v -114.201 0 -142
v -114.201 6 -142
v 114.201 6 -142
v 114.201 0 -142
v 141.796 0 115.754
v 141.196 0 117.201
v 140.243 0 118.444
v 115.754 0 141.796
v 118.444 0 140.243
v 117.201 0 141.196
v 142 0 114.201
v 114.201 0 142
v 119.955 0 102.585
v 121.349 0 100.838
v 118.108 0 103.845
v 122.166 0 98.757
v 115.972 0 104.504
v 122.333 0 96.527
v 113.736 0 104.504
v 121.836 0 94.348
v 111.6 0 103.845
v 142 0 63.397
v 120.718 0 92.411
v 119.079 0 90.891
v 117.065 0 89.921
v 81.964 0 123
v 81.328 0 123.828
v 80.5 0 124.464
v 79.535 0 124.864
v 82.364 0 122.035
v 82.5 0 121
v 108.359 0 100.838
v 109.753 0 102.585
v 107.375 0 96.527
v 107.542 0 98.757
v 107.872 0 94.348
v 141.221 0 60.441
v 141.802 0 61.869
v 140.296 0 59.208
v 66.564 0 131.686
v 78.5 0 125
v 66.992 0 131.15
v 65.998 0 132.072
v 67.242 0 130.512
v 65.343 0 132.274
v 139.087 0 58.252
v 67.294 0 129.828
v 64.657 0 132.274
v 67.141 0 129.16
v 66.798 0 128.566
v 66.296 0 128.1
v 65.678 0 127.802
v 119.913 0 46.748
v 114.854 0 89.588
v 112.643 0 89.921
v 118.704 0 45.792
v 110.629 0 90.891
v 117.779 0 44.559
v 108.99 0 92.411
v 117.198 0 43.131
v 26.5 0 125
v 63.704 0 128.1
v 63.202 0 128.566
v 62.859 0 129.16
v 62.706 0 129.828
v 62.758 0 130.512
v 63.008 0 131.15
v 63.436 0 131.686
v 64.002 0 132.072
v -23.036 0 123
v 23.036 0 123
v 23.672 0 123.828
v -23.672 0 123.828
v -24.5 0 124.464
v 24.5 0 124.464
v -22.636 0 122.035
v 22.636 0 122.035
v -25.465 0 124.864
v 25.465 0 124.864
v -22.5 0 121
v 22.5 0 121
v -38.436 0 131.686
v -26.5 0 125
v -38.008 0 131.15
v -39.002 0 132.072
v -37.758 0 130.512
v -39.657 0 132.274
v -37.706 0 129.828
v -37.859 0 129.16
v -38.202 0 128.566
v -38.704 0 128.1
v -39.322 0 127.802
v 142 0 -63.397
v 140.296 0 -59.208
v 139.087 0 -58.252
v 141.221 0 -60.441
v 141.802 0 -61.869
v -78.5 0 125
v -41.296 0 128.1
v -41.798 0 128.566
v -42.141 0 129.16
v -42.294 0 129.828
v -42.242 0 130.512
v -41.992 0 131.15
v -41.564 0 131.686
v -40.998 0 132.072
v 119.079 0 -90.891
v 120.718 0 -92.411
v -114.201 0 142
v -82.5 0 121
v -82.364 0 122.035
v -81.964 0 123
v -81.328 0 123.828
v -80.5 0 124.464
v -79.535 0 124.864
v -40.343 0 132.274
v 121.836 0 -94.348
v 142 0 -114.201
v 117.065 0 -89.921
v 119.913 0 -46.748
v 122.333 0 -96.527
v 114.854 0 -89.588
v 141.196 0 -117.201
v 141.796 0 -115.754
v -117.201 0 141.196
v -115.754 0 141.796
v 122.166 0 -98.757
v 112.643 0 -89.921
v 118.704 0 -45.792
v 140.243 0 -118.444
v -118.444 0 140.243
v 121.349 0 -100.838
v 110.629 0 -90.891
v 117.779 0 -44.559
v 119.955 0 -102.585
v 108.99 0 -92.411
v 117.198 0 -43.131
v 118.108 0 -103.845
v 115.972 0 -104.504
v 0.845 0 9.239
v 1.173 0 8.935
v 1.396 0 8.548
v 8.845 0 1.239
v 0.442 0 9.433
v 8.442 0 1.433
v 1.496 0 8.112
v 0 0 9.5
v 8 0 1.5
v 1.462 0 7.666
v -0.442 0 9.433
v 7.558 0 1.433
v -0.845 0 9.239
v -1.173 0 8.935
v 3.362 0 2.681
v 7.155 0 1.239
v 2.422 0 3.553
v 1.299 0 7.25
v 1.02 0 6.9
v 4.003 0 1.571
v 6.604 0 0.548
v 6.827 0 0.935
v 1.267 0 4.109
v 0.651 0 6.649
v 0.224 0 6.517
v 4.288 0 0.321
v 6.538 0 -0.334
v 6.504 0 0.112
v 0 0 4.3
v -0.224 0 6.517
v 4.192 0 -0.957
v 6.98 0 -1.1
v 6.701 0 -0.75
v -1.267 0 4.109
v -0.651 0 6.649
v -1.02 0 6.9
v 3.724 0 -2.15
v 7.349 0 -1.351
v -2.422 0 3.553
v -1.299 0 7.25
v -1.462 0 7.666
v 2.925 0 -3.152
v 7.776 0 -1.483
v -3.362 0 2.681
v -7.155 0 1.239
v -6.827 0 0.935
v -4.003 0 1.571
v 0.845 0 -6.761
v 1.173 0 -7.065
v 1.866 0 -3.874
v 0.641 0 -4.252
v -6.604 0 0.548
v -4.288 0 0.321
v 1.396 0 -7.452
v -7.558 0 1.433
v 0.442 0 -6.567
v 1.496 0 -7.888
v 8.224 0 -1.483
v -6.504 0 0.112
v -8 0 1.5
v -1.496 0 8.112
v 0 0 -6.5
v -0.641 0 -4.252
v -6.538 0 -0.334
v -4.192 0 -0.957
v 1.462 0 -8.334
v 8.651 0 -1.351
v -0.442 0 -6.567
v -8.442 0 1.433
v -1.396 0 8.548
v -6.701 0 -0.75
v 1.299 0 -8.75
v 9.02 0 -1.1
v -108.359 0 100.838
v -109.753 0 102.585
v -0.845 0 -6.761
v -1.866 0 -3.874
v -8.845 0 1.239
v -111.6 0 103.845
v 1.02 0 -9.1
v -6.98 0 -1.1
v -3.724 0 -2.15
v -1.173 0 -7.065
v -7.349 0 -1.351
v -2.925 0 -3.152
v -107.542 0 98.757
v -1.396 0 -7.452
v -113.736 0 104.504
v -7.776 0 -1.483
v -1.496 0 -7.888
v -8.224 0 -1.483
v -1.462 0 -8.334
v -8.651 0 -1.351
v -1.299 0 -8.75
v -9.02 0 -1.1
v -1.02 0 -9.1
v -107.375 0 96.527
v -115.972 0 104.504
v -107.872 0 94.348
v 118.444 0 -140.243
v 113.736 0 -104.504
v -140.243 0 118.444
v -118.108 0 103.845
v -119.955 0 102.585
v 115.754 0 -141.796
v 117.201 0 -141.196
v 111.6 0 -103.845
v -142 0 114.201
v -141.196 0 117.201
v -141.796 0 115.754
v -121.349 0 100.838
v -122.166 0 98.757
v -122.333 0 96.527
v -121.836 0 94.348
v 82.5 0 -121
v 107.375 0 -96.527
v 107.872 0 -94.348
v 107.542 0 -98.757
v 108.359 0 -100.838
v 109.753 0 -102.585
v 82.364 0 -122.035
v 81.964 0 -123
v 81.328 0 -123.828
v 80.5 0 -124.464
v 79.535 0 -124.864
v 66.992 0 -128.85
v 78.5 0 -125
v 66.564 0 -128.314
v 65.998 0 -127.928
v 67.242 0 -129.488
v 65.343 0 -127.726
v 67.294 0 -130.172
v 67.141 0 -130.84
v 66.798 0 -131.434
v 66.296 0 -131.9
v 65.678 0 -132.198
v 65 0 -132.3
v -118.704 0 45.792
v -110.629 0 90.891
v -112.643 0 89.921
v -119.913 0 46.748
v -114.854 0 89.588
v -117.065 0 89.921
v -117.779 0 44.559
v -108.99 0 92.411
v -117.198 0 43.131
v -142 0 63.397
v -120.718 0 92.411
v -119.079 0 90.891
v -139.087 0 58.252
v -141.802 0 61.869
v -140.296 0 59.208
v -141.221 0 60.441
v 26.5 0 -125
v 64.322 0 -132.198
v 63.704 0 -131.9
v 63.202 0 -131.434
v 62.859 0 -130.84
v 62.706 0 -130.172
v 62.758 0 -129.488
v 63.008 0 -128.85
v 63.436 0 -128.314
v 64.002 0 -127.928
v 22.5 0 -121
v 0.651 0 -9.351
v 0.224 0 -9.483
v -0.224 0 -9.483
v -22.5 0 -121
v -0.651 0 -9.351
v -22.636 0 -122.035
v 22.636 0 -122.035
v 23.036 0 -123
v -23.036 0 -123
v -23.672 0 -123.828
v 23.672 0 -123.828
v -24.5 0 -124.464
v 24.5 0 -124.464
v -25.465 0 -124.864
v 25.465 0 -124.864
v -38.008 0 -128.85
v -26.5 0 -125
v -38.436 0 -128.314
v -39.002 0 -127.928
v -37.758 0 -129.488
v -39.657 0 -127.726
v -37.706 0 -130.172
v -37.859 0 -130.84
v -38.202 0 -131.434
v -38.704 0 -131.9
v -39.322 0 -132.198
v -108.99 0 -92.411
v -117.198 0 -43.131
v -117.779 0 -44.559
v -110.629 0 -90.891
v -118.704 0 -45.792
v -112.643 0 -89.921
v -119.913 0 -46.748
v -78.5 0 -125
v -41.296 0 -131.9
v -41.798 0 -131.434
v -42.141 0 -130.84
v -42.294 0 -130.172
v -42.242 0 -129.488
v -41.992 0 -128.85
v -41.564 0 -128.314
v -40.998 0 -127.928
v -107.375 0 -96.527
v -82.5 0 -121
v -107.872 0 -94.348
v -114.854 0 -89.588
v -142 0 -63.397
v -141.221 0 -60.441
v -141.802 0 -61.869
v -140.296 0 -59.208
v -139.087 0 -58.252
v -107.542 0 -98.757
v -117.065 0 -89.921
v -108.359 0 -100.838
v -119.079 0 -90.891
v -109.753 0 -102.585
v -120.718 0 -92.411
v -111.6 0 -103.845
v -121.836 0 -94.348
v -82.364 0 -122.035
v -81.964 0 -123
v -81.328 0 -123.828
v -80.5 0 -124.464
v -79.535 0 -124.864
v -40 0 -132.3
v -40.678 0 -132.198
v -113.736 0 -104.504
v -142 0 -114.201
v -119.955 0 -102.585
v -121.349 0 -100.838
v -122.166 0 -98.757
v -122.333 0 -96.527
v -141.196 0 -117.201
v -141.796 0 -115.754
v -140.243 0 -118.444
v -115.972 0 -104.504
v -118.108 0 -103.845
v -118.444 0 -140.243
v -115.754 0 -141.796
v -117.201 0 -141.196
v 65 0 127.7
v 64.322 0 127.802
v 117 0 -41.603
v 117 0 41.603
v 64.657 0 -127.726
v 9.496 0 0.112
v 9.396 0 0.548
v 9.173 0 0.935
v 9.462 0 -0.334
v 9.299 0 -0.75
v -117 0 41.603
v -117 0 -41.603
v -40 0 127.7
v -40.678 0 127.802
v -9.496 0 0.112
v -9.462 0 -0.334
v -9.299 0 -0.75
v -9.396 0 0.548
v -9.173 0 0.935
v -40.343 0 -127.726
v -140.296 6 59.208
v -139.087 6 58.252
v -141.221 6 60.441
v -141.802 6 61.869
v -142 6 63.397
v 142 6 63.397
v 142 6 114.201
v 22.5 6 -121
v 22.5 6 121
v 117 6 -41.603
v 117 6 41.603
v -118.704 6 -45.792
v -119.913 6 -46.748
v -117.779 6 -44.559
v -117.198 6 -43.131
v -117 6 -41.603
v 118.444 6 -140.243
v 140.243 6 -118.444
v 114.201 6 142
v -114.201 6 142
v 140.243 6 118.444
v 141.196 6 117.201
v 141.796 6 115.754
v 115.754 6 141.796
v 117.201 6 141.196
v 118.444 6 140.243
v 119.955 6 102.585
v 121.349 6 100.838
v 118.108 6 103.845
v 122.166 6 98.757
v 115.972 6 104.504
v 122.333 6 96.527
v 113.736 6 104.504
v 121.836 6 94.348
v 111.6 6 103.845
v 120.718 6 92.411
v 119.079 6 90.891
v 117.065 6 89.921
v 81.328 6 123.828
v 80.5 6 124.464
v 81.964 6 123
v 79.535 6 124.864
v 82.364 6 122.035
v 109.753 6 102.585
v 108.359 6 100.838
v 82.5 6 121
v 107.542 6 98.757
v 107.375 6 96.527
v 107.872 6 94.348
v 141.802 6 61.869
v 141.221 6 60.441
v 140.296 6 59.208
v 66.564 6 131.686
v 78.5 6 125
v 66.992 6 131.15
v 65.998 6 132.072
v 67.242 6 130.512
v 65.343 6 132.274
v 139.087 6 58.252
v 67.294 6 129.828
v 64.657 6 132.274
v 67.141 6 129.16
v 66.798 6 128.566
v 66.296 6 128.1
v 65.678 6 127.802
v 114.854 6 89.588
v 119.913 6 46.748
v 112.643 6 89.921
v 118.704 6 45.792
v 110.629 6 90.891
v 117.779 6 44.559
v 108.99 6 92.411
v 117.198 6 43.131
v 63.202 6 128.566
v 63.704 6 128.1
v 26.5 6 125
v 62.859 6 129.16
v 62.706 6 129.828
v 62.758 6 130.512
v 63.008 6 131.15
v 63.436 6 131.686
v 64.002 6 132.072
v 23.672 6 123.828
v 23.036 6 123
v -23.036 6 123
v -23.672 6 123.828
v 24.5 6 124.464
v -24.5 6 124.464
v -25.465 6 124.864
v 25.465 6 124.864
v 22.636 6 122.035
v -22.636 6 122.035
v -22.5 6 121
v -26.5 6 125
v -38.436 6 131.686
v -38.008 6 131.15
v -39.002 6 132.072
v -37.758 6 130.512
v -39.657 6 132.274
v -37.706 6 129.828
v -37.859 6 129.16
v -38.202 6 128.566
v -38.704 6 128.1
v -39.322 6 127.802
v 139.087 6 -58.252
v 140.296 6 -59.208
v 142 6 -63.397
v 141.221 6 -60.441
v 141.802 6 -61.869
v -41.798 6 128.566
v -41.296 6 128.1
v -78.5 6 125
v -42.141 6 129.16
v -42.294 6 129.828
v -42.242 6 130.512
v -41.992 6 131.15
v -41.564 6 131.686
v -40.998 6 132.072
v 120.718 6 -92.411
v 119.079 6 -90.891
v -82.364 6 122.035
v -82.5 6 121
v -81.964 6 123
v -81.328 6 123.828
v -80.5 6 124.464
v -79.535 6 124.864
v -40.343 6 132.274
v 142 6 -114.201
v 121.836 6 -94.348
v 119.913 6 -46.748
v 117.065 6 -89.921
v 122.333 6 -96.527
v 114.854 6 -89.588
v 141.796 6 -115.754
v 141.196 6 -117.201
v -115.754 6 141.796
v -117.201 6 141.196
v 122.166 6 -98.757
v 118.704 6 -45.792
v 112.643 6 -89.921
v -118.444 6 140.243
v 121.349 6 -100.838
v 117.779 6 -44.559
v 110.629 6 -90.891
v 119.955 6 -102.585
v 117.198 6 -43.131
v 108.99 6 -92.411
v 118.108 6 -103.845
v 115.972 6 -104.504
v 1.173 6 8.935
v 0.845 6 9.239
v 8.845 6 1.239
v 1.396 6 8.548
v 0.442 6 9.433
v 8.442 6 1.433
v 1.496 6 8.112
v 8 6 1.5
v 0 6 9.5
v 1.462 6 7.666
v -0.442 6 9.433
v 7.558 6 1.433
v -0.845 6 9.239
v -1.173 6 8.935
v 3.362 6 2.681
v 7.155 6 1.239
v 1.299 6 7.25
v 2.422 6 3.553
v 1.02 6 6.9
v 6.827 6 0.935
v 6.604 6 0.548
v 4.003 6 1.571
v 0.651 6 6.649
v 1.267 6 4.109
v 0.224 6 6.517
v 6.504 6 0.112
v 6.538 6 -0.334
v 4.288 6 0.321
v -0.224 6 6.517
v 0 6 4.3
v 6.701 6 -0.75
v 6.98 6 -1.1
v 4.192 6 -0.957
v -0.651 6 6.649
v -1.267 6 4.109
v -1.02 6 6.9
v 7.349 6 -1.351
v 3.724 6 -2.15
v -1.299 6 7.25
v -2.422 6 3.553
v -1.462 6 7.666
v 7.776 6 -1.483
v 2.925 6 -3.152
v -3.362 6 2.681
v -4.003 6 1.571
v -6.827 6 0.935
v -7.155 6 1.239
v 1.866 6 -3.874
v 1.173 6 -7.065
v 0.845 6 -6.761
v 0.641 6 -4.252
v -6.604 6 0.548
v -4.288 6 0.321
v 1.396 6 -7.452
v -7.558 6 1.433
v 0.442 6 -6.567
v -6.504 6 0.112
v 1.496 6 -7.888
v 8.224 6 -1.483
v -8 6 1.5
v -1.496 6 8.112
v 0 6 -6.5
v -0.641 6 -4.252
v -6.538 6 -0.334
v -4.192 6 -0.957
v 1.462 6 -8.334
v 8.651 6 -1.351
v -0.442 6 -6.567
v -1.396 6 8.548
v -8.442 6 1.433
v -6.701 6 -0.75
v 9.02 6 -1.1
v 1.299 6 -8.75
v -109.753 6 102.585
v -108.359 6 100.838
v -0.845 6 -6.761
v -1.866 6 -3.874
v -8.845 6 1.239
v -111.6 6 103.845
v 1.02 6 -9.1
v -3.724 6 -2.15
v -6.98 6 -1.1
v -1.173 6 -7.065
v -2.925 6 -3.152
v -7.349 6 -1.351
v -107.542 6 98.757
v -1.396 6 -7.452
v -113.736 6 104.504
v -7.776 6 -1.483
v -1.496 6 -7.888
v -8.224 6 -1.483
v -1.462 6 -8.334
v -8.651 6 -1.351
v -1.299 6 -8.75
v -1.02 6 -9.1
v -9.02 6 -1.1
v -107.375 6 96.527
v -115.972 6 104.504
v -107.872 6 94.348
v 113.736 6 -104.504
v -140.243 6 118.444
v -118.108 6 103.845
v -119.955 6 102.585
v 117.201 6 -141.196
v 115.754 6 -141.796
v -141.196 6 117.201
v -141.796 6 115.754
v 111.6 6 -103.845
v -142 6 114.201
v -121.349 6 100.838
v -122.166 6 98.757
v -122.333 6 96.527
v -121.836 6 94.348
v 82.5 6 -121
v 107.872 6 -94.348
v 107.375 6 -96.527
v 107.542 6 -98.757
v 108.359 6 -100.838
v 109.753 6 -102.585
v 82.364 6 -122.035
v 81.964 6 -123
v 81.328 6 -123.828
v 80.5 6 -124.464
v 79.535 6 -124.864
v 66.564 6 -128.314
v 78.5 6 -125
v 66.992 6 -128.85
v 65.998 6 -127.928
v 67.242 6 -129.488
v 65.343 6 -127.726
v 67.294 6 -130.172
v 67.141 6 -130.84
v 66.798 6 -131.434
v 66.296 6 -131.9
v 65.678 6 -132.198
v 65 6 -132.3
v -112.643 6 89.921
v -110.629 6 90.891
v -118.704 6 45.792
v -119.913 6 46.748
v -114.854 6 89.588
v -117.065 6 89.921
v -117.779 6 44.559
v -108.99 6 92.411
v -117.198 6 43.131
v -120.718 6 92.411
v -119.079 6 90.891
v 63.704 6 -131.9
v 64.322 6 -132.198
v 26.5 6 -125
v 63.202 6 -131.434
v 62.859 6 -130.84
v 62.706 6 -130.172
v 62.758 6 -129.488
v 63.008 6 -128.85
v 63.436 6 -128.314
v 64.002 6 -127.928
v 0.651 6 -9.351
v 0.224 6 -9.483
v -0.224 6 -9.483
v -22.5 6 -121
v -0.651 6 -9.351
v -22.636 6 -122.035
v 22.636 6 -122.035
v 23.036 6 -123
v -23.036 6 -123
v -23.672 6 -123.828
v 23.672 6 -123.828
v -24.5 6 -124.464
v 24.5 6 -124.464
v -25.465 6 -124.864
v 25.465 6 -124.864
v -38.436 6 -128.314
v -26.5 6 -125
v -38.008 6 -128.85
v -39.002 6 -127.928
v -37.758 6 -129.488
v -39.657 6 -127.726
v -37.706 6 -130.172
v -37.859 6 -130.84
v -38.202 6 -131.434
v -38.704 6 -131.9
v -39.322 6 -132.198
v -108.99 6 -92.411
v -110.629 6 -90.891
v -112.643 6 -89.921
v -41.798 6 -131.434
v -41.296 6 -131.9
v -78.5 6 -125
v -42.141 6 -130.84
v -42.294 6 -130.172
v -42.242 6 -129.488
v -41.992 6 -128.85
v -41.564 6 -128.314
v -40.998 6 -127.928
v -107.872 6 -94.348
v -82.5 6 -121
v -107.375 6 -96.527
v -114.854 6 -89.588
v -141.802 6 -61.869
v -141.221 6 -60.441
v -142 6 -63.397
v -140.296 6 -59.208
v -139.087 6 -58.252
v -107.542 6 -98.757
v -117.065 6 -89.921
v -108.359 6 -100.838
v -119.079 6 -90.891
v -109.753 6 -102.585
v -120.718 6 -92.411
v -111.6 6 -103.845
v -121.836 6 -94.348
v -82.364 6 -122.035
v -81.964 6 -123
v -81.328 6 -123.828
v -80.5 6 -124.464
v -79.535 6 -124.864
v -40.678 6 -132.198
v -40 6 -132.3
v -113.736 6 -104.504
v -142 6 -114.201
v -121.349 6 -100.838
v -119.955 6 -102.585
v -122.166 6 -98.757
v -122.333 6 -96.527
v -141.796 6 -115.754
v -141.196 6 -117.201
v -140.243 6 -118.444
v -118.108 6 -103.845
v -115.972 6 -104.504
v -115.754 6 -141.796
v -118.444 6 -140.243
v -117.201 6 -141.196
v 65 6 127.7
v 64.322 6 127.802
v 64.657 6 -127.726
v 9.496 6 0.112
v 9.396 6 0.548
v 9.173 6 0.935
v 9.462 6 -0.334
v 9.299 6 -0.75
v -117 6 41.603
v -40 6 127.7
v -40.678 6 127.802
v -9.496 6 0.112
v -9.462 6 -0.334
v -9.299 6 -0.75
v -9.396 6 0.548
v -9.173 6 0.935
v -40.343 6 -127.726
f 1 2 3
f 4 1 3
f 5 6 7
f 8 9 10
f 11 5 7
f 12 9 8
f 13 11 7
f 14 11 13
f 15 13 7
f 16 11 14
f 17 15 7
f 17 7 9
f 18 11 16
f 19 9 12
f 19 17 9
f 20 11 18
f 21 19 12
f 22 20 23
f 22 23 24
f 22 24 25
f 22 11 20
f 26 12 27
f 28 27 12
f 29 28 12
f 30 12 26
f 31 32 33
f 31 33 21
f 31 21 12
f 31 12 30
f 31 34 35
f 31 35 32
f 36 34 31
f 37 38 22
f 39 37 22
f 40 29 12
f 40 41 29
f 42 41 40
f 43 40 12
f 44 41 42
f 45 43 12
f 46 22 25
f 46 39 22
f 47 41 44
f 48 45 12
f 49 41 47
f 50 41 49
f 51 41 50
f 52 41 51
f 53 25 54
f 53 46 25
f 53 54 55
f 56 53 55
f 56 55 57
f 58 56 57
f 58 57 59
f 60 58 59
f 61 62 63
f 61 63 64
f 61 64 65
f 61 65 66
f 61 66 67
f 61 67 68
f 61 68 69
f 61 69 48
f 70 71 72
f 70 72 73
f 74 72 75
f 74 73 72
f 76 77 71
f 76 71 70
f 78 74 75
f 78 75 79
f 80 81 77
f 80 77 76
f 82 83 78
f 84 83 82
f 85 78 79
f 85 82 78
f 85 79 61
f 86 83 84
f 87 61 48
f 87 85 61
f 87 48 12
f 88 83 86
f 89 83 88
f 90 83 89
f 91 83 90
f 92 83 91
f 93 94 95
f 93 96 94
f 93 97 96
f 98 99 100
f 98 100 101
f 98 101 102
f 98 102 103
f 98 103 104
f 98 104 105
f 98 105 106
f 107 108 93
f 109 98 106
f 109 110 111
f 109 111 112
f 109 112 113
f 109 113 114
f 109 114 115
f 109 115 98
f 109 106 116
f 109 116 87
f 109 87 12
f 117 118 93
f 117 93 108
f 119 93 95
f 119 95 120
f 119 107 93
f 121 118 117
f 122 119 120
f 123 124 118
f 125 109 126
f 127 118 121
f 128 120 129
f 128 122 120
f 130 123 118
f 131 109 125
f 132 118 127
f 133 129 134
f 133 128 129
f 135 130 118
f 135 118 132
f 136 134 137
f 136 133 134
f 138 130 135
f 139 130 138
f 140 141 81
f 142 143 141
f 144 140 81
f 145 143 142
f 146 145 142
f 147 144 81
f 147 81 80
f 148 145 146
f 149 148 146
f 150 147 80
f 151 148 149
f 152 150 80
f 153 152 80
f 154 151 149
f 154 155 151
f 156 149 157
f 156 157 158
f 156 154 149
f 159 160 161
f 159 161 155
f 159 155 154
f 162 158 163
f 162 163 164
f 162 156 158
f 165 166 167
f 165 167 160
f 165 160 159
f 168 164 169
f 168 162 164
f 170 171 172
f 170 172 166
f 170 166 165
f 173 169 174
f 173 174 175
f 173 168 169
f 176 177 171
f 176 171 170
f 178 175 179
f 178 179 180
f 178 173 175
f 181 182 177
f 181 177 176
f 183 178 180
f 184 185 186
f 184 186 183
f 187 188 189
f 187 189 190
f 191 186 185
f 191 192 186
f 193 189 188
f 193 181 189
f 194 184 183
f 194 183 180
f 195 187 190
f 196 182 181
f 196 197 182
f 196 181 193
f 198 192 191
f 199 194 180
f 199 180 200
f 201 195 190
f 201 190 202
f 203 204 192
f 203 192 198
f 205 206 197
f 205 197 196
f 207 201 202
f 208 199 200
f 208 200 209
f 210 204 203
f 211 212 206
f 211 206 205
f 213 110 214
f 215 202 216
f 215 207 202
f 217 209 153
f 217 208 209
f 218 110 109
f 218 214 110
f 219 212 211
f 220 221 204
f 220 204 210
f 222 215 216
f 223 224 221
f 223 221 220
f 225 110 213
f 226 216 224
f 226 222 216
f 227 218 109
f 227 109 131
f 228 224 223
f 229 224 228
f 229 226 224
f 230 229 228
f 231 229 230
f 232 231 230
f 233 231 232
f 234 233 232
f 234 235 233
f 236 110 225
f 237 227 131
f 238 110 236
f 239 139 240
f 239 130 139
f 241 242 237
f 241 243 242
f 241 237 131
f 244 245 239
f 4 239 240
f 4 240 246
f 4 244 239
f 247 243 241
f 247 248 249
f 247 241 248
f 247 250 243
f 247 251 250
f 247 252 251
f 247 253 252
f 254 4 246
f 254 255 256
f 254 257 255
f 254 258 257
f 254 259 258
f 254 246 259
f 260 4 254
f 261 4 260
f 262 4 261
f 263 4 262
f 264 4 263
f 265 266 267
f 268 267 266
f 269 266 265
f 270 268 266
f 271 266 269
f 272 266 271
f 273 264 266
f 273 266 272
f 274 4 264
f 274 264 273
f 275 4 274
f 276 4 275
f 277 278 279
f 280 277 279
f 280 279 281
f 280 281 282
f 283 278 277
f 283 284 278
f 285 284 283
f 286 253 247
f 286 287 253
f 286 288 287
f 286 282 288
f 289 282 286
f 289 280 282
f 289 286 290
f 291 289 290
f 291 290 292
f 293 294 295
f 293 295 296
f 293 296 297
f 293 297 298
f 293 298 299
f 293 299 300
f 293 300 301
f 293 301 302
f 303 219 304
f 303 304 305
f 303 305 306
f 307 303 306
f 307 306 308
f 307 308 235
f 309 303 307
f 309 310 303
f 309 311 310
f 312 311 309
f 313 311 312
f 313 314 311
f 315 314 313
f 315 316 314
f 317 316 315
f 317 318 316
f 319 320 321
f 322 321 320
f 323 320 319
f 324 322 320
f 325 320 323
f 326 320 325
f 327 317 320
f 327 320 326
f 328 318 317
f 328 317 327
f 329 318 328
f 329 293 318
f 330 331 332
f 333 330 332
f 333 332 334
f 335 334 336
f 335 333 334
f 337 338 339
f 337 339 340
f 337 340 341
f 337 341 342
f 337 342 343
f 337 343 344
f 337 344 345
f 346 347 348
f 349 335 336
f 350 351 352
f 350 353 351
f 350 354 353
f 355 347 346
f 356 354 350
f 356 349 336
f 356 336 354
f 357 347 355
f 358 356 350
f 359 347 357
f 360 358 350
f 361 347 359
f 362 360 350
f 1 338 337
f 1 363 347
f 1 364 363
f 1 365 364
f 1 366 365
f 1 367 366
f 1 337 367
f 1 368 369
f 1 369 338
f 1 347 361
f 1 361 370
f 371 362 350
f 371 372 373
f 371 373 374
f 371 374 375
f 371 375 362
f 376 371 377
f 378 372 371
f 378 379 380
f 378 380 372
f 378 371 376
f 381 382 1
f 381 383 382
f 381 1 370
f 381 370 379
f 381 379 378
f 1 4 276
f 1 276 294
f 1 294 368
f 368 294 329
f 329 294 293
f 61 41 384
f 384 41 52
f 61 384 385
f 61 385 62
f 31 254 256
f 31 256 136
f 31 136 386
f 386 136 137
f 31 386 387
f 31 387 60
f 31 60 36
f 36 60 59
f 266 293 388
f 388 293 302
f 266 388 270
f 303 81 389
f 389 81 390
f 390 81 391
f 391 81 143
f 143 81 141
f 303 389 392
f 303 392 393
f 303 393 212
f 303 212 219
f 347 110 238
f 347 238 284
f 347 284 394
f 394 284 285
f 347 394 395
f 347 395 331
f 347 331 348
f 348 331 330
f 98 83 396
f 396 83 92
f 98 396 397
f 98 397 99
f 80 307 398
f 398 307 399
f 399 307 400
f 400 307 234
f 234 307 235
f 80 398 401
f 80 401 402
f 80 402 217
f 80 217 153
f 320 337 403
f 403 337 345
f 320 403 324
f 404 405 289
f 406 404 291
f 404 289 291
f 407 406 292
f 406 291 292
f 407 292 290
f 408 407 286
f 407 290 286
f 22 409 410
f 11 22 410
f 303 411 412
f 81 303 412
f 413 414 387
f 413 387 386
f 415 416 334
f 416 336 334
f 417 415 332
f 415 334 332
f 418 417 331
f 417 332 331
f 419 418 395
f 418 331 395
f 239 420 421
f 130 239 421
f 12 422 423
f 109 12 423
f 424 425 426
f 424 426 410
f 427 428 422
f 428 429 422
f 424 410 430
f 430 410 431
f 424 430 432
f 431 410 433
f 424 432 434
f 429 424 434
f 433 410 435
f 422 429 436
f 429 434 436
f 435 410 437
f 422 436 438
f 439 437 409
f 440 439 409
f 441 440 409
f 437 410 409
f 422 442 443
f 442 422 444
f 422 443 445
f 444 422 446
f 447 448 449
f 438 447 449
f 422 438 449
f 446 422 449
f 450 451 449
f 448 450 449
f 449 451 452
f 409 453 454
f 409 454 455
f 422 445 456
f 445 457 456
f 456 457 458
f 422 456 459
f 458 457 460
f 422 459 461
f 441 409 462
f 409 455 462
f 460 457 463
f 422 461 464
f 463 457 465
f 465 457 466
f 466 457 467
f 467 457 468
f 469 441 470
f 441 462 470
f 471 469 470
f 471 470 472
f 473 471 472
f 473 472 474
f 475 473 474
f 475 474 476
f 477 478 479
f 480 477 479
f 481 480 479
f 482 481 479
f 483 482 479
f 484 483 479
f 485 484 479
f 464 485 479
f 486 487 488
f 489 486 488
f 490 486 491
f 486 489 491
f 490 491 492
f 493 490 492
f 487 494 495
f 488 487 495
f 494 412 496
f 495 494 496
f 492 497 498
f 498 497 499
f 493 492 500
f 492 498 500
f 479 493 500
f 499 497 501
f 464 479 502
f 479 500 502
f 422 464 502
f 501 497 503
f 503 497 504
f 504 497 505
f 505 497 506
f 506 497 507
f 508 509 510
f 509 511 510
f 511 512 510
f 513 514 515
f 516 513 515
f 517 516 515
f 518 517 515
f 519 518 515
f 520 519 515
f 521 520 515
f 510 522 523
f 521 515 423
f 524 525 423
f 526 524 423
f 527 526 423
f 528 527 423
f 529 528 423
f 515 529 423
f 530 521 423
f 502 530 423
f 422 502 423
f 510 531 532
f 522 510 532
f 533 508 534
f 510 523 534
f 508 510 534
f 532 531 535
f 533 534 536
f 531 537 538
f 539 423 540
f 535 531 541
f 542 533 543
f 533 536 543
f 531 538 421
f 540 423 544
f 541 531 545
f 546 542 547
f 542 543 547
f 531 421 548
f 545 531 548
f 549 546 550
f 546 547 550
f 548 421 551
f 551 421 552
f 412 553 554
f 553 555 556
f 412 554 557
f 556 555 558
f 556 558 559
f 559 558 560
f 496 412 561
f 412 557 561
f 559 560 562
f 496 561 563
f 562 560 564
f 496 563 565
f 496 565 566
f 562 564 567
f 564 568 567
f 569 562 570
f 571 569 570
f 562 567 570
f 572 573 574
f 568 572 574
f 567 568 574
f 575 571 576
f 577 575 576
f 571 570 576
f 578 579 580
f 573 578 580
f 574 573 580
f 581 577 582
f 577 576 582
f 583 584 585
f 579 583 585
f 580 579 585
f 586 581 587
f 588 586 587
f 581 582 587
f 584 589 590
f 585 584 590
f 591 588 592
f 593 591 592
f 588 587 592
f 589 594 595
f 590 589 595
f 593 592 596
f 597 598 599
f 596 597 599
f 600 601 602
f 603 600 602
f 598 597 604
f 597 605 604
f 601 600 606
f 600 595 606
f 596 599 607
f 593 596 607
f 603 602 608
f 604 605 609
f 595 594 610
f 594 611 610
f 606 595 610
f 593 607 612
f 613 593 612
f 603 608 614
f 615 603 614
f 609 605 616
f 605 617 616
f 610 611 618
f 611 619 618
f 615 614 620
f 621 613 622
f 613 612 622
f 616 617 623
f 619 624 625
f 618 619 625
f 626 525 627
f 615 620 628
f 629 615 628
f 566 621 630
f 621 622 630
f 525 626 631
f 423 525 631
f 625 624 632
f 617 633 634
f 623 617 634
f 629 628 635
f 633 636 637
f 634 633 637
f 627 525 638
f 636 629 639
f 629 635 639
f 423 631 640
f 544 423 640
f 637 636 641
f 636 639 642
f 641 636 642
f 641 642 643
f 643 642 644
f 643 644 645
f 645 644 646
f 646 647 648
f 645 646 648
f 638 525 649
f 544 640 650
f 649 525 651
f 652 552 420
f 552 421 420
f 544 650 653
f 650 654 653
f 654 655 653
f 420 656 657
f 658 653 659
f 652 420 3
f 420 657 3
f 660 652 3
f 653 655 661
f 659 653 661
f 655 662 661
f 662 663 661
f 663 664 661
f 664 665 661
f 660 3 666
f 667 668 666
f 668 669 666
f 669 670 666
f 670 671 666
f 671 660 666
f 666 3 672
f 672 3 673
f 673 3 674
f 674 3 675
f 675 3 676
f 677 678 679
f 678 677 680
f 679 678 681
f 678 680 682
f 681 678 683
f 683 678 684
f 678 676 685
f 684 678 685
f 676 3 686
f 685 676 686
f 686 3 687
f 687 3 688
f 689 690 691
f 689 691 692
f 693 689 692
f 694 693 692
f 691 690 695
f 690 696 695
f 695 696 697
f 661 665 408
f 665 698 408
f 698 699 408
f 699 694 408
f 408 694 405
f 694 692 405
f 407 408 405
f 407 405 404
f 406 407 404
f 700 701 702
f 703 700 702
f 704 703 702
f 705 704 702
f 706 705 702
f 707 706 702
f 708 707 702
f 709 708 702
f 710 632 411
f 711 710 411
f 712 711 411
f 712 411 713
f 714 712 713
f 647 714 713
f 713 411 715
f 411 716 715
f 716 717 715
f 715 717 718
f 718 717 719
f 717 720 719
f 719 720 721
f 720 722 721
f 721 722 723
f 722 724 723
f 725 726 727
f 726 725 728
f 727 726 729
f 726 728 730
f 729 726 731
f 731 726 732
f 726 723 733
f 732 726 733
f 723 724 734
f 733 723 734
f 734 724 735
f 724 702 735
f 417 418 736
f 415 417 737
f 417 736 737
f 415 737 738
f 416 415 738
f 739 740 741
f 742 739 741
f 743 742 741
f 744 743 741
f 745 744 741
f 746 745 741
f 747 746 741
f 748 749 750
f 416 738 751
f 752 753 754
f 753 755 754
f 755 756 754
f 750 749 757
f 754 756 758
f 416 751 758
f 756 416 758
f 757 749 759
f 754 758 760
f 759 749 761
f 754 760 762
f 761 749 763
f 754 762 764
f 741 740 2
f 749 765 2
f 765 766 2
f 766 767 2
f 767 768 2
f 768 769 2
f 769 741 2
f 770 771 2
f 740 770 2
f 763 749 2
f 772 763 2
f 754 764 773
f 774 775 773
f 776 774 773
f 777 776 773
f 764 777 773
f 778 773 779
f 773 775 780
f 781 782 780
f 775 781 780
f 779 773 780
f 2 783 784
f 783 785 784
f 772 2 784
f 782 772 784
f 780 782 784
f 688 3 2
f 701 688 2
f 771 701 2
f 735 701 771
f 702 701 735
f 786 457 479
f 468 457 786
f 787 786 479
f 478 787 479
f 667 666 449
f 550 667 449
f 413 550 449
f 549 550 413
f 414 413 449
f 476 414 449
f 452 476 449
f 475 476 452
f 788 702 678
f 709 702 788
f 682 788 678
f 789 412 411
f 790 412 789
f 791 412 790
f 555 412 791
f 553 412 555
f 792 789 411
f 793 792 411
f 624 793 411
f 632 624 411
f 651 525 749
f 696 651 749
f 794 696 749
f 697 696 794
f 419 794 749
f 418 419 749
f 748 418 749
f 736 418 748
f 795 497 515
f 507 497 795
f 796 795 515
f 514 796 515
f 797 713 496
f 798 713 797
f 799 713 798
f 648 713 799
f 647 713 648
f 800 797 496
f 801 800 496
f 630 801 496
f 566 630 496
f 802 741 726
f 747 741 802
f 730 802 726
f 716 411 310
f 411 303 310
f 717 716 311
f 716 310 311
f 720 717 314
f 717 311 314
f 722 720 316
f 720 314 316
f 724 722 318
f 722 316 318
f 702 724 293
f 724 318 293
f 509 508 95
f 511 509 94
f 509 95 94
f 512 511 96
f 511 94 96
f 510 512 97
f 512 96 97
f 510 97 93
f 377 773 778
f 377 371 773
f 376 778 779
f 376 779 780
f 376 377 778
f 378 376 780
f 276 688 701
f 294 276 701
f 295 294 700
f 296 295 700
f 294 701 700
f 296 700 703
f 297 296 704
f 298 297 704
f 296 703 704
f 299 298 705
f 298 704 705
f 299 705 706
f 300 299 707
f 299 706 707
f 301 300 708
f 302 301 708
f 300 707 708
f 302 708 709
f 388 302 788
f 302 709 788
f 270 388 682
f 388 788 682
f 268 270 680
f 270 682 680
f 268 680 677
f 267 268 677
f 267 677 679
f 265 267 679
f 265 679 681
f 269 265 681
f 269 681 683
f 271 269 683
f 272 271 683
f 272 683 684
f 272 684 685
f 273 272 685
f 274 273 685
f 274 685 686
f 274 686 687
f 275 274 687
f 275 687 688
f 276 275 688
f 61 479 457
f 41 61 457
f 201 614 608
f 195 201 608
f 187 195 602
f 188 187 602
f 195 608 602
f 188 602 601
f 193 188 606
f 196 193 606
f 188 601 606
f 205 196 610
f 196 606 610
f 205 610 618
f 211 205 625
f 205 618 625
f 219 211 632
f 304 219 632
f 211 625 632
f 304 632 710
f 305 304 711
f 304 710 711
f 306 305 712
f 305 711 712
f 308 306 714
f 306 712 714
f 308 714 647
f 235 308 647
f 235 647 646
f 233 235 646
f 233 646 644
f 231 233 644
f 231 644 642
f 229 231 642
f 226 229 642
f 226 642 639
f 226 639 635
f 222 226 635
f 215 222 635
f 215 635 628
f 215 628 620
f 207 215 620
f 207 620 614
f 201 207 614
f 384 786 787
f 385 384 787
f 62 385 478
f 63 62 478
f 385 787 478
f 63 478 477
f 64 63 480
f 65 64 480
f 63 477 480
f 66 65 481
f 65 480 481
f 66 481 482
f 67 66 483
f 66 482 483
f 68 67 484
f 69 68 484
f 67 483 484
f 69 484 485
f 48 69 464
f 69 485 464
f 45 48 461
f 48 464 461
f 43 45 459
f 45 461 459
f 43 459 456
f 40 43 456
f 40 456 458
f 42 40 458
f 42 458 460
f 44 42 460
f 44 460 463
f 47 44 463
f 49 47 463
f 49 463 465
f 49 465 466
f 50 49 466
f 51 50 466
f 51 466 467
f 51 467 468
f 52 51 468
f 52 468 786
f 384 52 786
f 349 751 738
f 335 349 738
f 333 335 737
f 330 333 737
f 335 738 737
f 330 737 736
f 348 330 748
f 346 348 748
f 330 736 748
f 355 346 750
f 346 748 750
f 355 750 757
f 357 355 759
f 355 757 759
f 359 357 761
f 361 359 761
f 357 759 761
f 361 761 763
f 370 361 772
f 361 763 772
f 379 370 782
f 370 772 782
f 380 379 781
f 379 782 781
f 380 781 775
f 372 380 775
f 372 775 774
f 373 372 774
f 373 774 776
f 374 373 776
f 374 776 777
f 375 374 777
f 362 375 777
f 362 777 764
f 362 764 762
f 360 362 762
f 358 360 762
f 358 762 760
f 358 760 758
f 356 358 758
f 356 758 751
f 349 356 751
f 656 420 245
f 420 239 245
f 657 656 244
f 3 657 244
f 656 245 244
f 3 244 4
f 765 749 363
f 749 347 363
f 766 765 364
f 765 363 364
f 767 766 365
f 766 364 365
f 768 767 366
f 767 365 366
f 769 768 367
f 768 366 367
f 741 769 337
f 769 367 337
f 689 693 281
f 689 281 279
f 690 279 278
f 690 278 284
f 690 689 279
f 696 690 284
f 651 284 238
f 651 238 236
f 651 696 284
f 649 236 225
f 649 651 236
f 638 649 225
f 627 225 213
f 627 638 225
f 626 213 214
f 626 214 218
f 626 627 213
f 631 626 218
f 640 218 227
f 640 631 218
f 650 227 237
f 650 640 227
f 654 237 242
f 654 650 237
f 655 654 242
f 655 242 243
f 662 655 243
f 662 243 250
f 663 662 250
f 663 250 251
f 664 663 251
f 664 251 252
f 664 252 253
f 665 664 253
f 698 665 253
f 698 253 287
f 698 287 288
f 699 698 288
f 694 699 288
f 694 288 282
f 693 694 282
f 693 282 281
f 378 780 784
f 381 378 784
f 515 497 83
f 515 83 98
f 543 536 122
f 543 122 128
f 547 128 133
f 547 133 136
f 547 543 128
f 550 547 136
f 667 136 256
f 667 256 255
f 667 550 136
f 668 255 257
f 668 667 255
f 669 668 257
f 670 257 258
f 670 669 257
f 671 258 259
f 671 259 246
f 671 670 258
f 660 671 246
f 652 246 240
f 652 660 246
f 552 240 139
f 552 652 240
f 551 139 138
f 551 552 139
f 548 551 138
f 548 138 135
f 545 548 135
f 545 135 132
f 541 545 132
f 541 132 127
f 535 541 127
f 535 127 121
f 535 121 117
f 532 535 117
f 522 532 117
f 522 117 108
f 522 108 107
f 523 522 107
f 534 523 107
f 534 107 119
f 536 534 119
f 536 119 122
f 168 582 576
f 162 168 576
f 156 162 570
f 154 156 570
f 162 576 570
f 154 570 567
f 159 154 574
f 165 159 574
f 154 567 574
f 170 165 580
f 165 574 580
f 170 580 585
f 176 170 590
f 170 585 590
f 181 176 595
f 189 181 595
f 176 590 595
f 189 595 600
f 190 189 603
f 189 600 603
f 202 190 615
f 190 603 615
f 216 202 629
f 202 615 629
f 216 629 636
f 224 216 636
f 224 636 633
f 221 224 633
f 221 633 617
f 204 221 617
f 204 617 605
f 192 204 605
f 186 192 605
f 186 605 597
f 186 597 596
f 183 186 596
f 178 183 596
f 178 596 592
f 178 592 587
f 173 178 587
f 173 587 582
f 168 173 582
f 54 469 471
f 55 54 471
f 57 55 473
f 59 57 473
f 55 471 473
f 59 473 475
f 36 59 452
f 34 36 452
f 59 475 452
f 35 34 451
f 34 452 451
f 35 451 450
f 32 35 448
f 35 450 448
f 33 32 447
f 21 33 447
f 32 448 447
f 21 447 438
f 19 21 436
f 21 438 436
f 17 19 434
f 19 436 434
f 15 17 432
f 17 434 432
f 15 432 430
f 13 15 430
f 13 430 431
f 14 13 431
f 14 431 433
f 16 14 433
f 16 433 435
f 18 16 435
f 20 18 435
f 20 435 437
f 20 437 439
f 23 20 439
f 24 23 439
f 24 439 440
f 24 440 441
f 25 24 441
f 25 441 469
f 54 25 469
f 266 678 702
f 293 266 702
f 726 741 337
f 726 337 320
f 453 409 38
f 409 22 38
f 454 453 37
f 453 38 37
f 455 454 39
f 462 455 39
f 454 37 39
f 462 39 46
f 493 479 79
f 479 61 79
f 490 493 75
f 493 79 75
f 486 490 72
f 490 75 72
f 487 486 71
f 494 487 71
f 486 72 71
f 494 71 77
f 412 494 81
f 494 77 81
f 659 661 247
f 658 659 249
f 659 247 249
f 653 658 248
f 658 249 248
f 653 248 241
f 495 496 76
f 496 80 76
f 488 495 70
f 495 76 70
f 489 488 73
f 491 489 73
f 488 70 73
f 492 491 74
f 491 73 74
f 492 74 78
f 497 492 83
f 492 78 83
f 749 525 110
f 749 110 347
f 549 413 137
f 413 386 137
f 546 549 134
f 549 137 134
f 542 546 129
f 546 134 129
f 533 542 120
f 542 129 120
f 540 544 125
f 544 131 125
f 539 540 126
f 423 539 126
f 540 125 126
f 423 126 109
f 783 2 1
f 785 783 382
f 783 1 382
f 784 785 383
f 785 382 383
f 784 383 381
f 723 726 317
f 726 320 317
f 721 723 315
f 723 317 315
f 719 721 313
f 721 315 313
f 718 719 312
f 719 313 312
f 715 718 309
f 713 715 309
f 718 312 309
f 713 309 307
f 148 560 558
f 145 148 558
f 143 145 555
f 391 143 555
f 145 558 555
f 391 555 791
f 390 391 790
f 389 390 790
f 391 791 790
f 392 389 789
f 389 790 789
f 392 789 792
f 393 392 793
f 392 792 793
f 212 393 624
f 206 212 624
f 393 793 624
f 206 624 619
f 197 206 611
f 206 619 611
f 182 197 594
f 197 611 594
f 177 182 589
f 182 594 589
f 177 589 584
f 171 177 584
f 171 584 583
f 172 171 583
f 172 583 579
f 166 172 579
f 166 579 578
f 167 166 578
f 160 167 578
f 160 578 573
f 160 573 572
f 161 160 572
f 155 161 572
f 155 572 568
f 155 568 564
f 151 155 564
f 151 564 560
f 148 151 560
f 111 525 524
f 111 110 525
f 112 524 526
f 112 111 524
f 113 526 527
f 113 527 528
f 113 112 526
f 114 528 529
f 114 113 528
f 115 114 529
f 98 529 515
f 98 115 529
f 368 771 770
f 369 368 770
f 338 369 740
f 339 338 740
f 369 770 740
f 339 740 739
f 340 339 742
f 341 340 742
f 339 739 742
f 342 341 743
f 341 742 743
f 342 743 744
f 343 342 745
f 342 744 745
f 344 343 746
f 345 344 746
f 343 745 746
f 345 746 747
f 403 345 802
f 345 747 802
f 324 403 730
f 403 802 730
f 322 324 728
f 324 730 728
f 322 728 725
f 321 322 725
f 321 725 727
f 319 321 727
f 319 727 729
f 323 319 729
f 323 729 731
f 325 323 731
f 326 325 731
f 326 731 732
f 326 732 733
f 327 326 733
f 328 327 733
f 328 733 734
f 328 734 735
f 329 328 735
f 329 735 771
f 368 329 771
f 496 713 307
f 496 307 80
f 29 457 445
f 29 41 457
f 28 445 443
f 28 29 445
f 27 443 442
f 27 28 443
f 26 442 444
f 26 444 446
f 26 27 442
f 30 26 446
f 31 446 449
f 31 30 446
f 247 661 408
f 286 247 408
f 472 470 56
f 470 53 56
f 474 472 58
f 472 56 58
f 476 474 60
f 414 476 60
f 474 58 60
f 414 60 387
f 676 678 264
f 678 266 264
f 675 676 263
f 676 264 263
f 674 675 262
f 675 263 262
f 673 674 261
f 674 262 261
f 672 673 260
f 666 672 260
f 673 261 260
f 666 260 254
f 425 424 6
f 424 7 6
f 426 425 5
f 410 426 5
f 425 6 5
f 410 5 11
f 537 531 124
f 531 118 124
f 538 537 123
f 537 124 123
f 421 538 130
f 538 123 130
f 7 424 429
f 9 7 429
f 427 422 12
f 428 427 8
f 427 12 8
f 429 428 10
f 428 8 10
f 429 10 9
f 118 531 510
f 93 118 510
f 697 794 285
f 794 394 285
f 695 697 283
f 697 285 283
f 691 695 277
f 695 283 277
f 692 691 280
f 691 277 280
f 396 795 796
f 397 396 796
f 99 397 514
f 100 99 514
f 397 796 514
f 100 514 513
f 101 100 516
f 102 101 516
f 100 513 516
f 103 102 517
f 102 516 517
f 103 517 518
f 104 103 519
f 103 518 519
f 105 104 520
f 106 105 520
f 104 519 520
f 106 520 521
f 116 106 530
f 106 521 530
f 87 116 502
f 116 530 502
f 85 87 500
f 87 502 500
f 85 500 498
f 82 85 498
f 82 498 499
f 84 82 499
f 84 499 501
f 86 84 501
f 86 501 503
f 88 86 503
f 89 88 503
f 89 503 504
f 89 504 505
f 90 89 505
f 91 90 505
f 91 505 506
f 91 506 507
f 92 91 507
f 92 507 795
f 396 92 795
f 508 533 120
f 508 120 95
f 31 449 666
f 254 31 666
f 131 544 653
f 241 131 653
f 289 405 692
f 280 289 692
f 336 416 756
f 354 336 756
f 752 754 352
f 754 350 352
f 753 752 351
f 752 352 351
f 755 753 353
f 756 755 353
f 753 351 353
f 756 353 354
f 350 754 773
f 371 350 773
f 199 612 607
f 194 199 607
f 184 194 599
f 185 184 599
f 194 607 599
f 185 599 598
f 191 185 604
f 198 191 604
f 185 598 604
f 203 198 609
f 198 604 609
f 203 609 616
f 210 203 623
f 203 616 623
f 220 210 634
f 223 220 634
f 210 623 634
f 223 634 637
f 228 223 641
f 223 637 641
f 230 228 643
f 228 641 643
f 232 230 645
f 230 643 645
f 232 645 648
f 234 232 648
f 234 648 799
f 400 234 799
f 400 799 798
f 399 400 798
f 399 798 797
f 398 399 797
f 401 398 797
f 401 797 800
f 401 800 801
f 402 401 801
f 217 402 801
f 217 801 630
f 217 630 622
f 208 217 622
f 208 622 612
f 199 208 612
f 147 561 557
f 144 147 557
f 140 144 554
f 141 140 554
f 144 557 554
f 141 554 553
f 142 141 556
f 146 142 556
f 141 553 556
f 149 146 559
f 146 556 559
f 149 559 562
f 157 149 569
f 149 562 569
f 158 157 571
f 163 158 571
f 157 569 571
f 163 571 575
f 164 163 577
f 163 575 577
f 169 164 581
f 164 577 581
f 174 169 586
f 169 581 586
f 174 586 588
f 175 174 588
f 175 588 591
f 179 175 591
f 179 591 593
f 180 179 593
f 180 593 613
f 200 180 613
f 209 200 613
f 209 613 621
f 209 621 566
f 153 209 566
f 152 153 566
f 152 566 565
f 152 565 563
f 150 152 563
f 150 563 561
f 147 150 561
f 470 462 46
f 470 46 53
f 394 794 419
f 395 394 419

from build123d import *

# Parameters (mm, degrees)
BOSS_EXTRU_1_DEPTH                   = 6
ENL_V_MAT_EXTRU_10_REACH             = 214.217
ESQUISSE12_R                         = 7.5
SYM_TRIE10_COPY_1_REACH              = 214.217
SYM_TRIE10_COPY_1_SKETCH_R           = 7.5
ENL_V_MAT_EXTRU_11_REACH             = 214.217
ESQUISSE13_R                         = 4.3
ESQUISSE13_R_2                       = 1.5
ENL_V_MAT_EXTRU_12_REACH             = 214.217
CONG_1_R                             = 4
CONG_1_OF_SYM_TRIE11_R               = 4
ENL_V_MAT_EXTRU_13_REACH             = 214.217
ESQUISSE15_R                         = 2.3
ENL_V_MAT_EXTRU_13_DIRECTION_2_DEPTH = 213.216870206
R_P_TITION_LIN_AIRE1_COUNT           = 2
R_P_TITION_LIN_AIRE1_PITCH           = 105
ENL_V_MAT_EXTRU_14_DEPTH             = 24
ENL_V_MAT_EXTRU_15_REACH             = 202.908
ESQUISSE17_W                         = 25
ESQUISSE17_H                         = 45
CONG_2_R                             = 6


with BuildPart() as part:
    # Esquisse1 → Boss.-Extru.1 (new body)
    with BuildSketch(Plane(origin=(0, 0, 0), x_dir=(1, 0, 0), z_dir=(0, 1, 0))):
        Polygon((-150, 0), (-150, 120), (-120, 150), (0, 150), (120, 150), (150, 120), (150, 0), (150, -120), (120, -150), (0, -150), (-120, -150), (-150, -120), align=None)
    extrude(amount=BOSS_EXTRU_1_DEPTH)

    # Esquisse12 → Enlèv. mat.-Extru.10 (cut, up to next)
    with BuildSketch(Plane(origin=(0, 6, 0), x_dir=(1, 0, 0), z_dir=(0, 1, 0)), mode=Mode.PRIVATE) as enl_v_mat_extru_10_sk1:
        with Locations(Location((-114.854021031, 97.087596514, 0), (0, 0, 270))):
            Circle(ESQUISSE12_R)
    enl_v_mat_extru_10_tool1 = extrude(enl_v_mat_extru_10_sk1.sketch, amount=-ENL_V_MAT_EXTRU_10_REACH, mode=Mode.PRIVATE) & part.part
    enl_v_mat_extru_10 = enl_v_mat_extru_10_tool1.solids().sort_by_distance((-114.854021, 6, -97.087597))[0]
    add(enl_v_mat_extru_10, mode=Mode.SUBTRACT)

    # Symétrie9: Enlèv. mat.-Extru.10 across plane
    add(enl_v_mat_extru_10.mirror(Plane(origin=(0, 0, 0), x_dir=(0, 0, 1), z_dir=(1, 0, 0))), mode=Mode.SUBTRACT)

    # Symétrie10: Enlèv. mat.-Extru.10 across plane
    add(enl_v_mat_extru_10.mirror(Plane.XY), mode=Mode.SUBTRACT)

    # Symétrie10 copy 1 sketch → Symétrie10 copy 1 (cut, up to next)
    with BuildSketch(Plane(origin=(0, 6, 0), x_dir=(-1, 0, 0), z_dir=(0, 1, 0)), mode=Mode.PRIVATE) as sym_trie10_copy_1_sk1:
        with Locations(Location((-114.854021031, 97.087596514, 0), (0, 0, 270))):
            Circle(SYM_TRIE10_COPY_1_SKETCH_R)
    sym_trie10_copy_1_tool1 = extrude(sym_trie10_copy_1_sk1.sketch, amount=-SYM_TRIE10_COPY_1_REACH, mode=Mode.PRIVATE) & part.part
    add(sym_trie10_copy_1_tool1.solids().sort_by_distance((114.854021, 6, 97.087597))[0], mode=Mode.SUBTRACT)

    # Esquisse13 → Enlèv. mat.-Extru.11 (cut, up to next)
    with BuildSketch(Plane(origin=(0, 6, 0), x_dir=(1, 0, 0), z_dir=(0, 1, 0)), mode=Mode.PRIVATE) as enl_v_mat_extru_11_sk1:
        with Locations(Location((0, 0, 0), (0, 0, 270))):
            Circle(ESQUISSE13_R)
    enl_v_mat_extru_11_tool1 = extrude(enl_v_mat_extru_11_sk1.sketch, amount=-ENL_V_MAT_EXTRU_11_REACH, mode=Mode.PRIVATE) & part.part
    # Esquisse13 → Enlèv. mat.-Extru.11 (cut, up to next)
    with BuildSketch(Plane(origin=(0, 6, 0), x_dir=(1, 0, 0), z_dir=(0, 1, 0)), mode=Mode.PRIVATE) as enl_v_mat_extru_11_sk2:
        with Locations(Location((8, 0, 0), (0, 0, 270))):
            Circle(ESQUISSE13_R_2)
    enl_v_mat_extru_11_tool2 = extrude(enl_v_mat_extru_11_sk2.sketch, amount=-ENL_V_MAT_EXTRU_11_REACH, mode=Mode.PRIVATE) & part.part
    # Esquisse13 → Enlèv. mat.-Extru.11 (cut, up to next)
    with BuildSketch(Plane(origin=(0, 6, 0), x_dir=(1, 0, 0), z_dir=(0, 1, 0)), mode=Mode.PRIVATE) as enl_v_mat_extru_11_sk3:
        with Locations(Location((0, -8, 0), (0, 0, 270))):
            Circle(ESQUISSE13_R_2)
    enl_v_mat_extru_11_tool3 = extrude(enl_v_mat_extru_11_sk3.sketch, amount=-ENL_V_MAT_EXTRU_11_REACH, mode=Mode.PRIVATE) & part.part
    # Esquisse13 → Enlèv. mat.-Extru.11 (cut, up to next)
    with BuildSketch(Plane(origin=(0, 6, 0), x_dir=(1, 0, 0), z_dir=(0, 1, 0)), mode=Mode.PRIVATE) as enl_v_mat_extru_11_sk4:
        with Locations(Location((0, 8, 0), (0, 0, 270))):
            Circle(ESQUISSE13_R_2)
    enl_v_mat_extru_11_tool4 = extrude(enl_v_mat_extru_11_sk4.sketch, amount=-ENL_V_MAT_EXTRU_11_REACH, mode=Mode.PRIVATE) & part.part
    # Esquisse13 → Enlèv. mat.-Extru.11 (cut, up to next)
    with BuildSketch(Plane(origin=(0, 6, 0), x_dir=(1, 0, 0), z_dir=(0, 1, 0)), mode=Mode.PRIVATE) as enl_v_mat_extru_11_sk5:
        with Locations(Location((-8, 0, 0), (0, 0, 270))):
            Circle(ESQUISSE13_R_2)
    enl_v_mat_extru_11_tool5 = extrude(enl_v_mat_extru_11_sk5.sketch, amount=-ENL_V_MAT_EXTRU_11_REACH, mode=Mode.PRIVATE) & part.part
    add(enl_v_mat_extru_11_tool1.solids().sort_by_distance((0, 6, 0))[0], mode=Mode.SUBTRACT)
    add(enl_v_mat_extru_11_tool2.solids().sort_by_distance((8, 6, 0))[0], mode=Mode.SUBTRACT)
    add(enl_v_mat_extru_11_tool3.solids().sort_by_distance((0, 6, 8))[0], mode=Mode.SUBTRACT)
    add(enl_v_mat_extru_11_tool4.solids().sort_by_distance((0, 6, -8))[0], mode=Mode.SUBTRACT)
    add(enl_v_mat_extru_11_tool5.solids().sort_by_distance((-8, 6, 0))[0], mode=Mode.SUBTRACT)

    # Esquisse14 → Enlèv. mat.-Extru.12 (cut, up to next)
    with BuildSketch(Plane(origin=(0, 6, 0), x_dir=(1, 0, 0), z_dir=(0, 1, 0)), mode=Mode.PRIVATE) as enl_v_mat_extru_12_sk1:
        Polygon((52.5, -125), (82.5, -125), (82.5, 125), (22.5, 125), (22.5, -125), align=None)
    enl_v_mat_extru_12_tool1 = extrude(enl_v_mat_extru_12_sk1.sketch, amount=-ENL_V_MAT_EXTRU_12_REACH, mode=Mode.PRIVATE) & part.part
    enl_v_mat_extru_12 = enl_v_mat_extru_12_tool1.solids().sort_by_distance((52.5, 6, 0))[0]
    add(enl_v_mat_extru_12, mode=Mode.SUBTRACT)

    # Congé1
    cong_1_edges = [part.edges().sort_by_distance(p)[0] for p in [
        (22.5, 3, -125),
        (82.5, 3, -125),
        (82.5, 3, 125),
        (22.5, 3, 125),
    ]]
    fillet(cong_1_edges, radius=CONG_1_R)

    # Symétrie11: Enlèv. mat.-Extru.12 across plane
    add(enl_v_mat_extru_12.mirror(Plane(origin=(0, 0, 0), x_dir=(0, 0, 1), z_dir=(1, 0, 0))), mode=Mode.SUBTRACT)

    # Congé1 of Symétrie11
    cong_1_of_sym_trie11_edges = [part.edges().sort_by_distance(p)[0] for p in [
        (-22.5, 3, -125),
        (-82.5, 3, -125),
        (-82.5, 3, 125),
        (-22.5, 3, 125),
    ]]
    fillet(cong_1_of_sym_trie11_edges, radius=CONG_1_OF_SYM_TRIE11_R)

    # Esquisse15 → Enlèv. mat.-Extru.13 (cut, up to next)
    with BuildSketch(Plane(origin=(0, 6, 0), x_dir=(1, 0, 0), z_dir=(0, 1, 0)), mode=Mode.PRIVATE) as enl_v_mat_extru_13_sk1:
        with Locations(Location((-40, 130, 0), (0, 0, 90))):
            Circle(ESQUISSE15_R)
    enl_v_mat_extru_13_tool1 = extrude(enl_v_mat_extru_13_sk1.sketch, amount=-ENL_V_MAT_EXTRU_13_REACH, mode=Mode.PRIVATE) & part.part
    # Esquisse15 → Enlèv. mat.-Extru.13 (cut, up to next)
    with BuildSketch(Plane(origin=(0, 6, 0), x_dir=(1, 0, 0), z_dir=(0, 1, 0)), mode=Mode.PRIVATE) as enl_v_mat_extru_13_sk2:
        with Locations(Location((-40, -130, 0), (0, 0, 90))):
            Circle(ESQUISSE15_R)
    enl_v_mat_extru_13_tool2 = extrude(enl_v_mat_extru_13_sk2.sketch, amount=-ENL_V_MAT_EXTRU_13_REACH, mode=Mode.PRIVATE) & part.part
    enl_v_mat_extru_13_1 = enl_v_mat_extru_13_tool1.solids().sort_by_distance((-40, 6, -130))[0]
    add(enl_v_mat_extru_13_1, mode=Mode.SUBTRACT)
    enl_v_mat_extru_13_2 = enl_v_mat_extru_13_tool2.solids().sort_by_distance((-40, 6, 130))[0]
    add(enl_v_mat_extru_13_2, mode=Mode.SUBTRACT)
    enl_v_mat_extru_13 = enl_v_mat_extru_13_1 + enl_v_mat_extru_13_2  # Enlèv. mat.-Extru.13 as one shape, for the pattern or mirror that repeats it

    # Esquisse15 → Enlèv. mat.-Extru.13 direction 2 (cut)
    with BuildSketch(Plane(origin=(0, 6, 0), x_dir=(1, 0, 0), z_dir=(0, 1, 0))):
        with Locations(Location((-40, 130, 0), (0, 0, 90))):
            Circle(ESQUISSE15_R)
        with Locations(Location((-40, -130, 0), (0, 0, 90))):
            Circle(ESQUISSE15_R)
    enl_v_mat_extru_13_direction_2 = extrude(amount=ENL_V_MAT_EXTRU_13_DIRECTION_2_DEPTH, mode=Mode.SUBTRACT)

    # Répétition linéaire1: Enlèv. mat.-Extru.13, Enlèv. mat.-Extru.13 direction 2 ×2
    with Locations(*[(i * R_P_TITION_LIN_AIRE1_PITCH, 0, 0) for i in range(1, R_P_TITION_LIN_AIRE1_COUNT)]):
        add(enl_v_mat_extru_13, mode=Mode.SUBTRACT)
        add(enl_v_mat_extru_13_direction_2, mode=Mode.SUBTRACT)

    # Esquisse16 → Enlèv. mat.-Extru.14 (cut)
    with BuildSketch(Plane(origin=(0, 6, 0), x_dir=(1, 0, 0), z_dir=(0, 1, 0))):
        Polygon((150, 120), (120, 150), (-120, 150), (-150, 120), (-150, -120), (-120, -150), (120, -150), (150, -120), align=None)
        Polygon((-142, 116.686291501), (-116.686291501, 142), (116.686291501, 142), (142, 116.686291501), (142, -116.686291501), (116.686291501, -142), (-116.686291501, -142), (-142, -116.686291501), align=None, mode=Mode.SUBTRACT)
    extrude(amount=-ENL_V_MAT_EXTRU_14_DEPTH, mode=Mode.SUBTRACT)

    # Esquisse17 → Enlèv. mat.-Extru.15 (cut, up to next)
    with BuildSketch(Plane(origin=(0, 6, 0), x_dir=(1, 0, 0), z_dir=(0, 1, 0)), mode=Mode.PRIVATE) as enl_v_mat_extru_15_sk1:
        Polygon((-117, -45), (-142, -45), (-142, -60), align=None)
    enl_v_mat_extru_15_tool1 = extrude(enl_v_mat_extru_15_sk1.sketch, amount=-ENL_V_MAT_EXTRU_15_REACH, mode=Mode.PRIVATE) & part.part
    # Esquisse17 → Enlèv. mat.-Extru.15 (cut, up to next)
    with BuildSketch(Plane(origin=(0, 6, 0), x_dir=(1, 0, 0), z_dir=(0, 1, 0)), mode=Mode.PRIVATE) as enl_v_mat_extru_15_sk2:
        with Locations((-129.5, -22.5)):
            Rectangle(ESQUISSE17_W, ESQUISSE17_H)
    enl_v_mat_extru_15_tool2 = extrude(enl_v_mat_extru_15_sk2.sketch, amount=-ENL_V_MAT_EXTRU_15_REACH, mode=Mode.PRIVATE) & part.part
    # Esquisse17 → Enlèv. mat.-Extru.15 (cut, up to next)
    with BuildSketch(Plane(origin=(0, 6, 0), x_dir=(1, 0, 0), z_dir=(0, 1, 0)), mode=Mode.PRIVATE) as enl_v_mat_extru_15_sk3:
        with Locations((-129.5, 22.5)):
            Rectangle(ESQUISSE17_W, ESQUISSE17_H)
    enl_v_mat_extru_15_tool3 = extrude(enl_v_mat_extru_15_sk3.sketch, amount=-ENL_V_MAT_EXTRU_15_REACH, mode=Mode.PRIVATE) & part.part
    # Esquisse17 → Enlèv. mat.-Extru.15 (cut, up to next)
    with BuildSketch(Plane(origin=(0, 6, 0), x_dir=(1, 0, 0), z_dir=(0, 1, 0)), mode=Mode.PRIVATE) as enl_v_mat_extru_15_sk4:
        Polygon((-142, 60), (-142, 45), (-117, 45), align=None)
    enl_v_mat_extru_15_tool4 = extrude(enl_v_mat_extru_15_sk4.sketch, amount=-ENL_V_MAT_EXTRU_15_REACH, mode=Mode.PRIVATE) & part.part
    enl_v_mat_extru_15_1 = enl_v_mat_extru_15_tool1.solids().sort_by_distance((-133.666667, 6, 50))[0]
    add(enl_v_mat_extru_15_1, mode=Mode.SUBTRACT)
    enl_v_mat_extru_15_2 = enl_v_mat_extru_15_tool2.solids().sort_by_distance((-129.5, 6, 22.5))[0]
    add(enl_v_mat_extru_15_2, mode=Mode.SUBTRACT)
    enl_v_mat_extru_15_3 = enl_v_mat_extru_15_tool3.solids().sort_by_distance((-129.5, 6, -22.5))[0]
    add(enl_v_mat_extru_15_3, mode=Mode.SUBTRACT)
    enl_v_mat_extru_15_4 = enl_v_mat_extru_15_tool4.solids().sort_by_distance((-133.666667, 6, -50))[0]
    add(enl_v_mat_extru_15_4, mode=Mode.SUBTRACT)
    enl_v_mat_extru_15 = enl_v_mat_extru_15_1 + enl_v_mat_extru_15_2 + enl_v_mat_extru_15_3 + enl_v_mat_extru_15_4  # Enlèv. mat.-Extru.15 as one shape, for the pattern or mirror that repeats it

    # Symétrie12: Enlèv. mat.-Extru.15 across plane
    add(enl_v_mat_extru_15.mirror(Plane(origin=(0, 0, 0), x_dir=(0, 0, 1), z_dir=(1, 0, 0))), mode=Mode.SUBTRACT)

    # Congé2
    cong_2_edges = [part.edges().sort_by_distance(p)[0] for p in [
        (116.686291501, 3, -142),
        (-116.686291501, 3, -142),
        (-142, 3, -116.686291501),
        (-142, 3, 116.686291501),
        (-116.686291501, 3, 142),
        (116.686291501, 3, 142),
        (142, 3, 116.686291501),
        (142, 3, -116.686291501),
        (-117, 3, 45),
        (-142, 3, 60),
        (-142, 3, -60),
        (-117, 3, -45),
        (142, 3, 60),
        (117, 3, 45),
        (117, 3, -45),
        (142, 3, -60),
    ]]
    fillet(cong_2_edges, radius=CONG_2_R)


solid = part.part
